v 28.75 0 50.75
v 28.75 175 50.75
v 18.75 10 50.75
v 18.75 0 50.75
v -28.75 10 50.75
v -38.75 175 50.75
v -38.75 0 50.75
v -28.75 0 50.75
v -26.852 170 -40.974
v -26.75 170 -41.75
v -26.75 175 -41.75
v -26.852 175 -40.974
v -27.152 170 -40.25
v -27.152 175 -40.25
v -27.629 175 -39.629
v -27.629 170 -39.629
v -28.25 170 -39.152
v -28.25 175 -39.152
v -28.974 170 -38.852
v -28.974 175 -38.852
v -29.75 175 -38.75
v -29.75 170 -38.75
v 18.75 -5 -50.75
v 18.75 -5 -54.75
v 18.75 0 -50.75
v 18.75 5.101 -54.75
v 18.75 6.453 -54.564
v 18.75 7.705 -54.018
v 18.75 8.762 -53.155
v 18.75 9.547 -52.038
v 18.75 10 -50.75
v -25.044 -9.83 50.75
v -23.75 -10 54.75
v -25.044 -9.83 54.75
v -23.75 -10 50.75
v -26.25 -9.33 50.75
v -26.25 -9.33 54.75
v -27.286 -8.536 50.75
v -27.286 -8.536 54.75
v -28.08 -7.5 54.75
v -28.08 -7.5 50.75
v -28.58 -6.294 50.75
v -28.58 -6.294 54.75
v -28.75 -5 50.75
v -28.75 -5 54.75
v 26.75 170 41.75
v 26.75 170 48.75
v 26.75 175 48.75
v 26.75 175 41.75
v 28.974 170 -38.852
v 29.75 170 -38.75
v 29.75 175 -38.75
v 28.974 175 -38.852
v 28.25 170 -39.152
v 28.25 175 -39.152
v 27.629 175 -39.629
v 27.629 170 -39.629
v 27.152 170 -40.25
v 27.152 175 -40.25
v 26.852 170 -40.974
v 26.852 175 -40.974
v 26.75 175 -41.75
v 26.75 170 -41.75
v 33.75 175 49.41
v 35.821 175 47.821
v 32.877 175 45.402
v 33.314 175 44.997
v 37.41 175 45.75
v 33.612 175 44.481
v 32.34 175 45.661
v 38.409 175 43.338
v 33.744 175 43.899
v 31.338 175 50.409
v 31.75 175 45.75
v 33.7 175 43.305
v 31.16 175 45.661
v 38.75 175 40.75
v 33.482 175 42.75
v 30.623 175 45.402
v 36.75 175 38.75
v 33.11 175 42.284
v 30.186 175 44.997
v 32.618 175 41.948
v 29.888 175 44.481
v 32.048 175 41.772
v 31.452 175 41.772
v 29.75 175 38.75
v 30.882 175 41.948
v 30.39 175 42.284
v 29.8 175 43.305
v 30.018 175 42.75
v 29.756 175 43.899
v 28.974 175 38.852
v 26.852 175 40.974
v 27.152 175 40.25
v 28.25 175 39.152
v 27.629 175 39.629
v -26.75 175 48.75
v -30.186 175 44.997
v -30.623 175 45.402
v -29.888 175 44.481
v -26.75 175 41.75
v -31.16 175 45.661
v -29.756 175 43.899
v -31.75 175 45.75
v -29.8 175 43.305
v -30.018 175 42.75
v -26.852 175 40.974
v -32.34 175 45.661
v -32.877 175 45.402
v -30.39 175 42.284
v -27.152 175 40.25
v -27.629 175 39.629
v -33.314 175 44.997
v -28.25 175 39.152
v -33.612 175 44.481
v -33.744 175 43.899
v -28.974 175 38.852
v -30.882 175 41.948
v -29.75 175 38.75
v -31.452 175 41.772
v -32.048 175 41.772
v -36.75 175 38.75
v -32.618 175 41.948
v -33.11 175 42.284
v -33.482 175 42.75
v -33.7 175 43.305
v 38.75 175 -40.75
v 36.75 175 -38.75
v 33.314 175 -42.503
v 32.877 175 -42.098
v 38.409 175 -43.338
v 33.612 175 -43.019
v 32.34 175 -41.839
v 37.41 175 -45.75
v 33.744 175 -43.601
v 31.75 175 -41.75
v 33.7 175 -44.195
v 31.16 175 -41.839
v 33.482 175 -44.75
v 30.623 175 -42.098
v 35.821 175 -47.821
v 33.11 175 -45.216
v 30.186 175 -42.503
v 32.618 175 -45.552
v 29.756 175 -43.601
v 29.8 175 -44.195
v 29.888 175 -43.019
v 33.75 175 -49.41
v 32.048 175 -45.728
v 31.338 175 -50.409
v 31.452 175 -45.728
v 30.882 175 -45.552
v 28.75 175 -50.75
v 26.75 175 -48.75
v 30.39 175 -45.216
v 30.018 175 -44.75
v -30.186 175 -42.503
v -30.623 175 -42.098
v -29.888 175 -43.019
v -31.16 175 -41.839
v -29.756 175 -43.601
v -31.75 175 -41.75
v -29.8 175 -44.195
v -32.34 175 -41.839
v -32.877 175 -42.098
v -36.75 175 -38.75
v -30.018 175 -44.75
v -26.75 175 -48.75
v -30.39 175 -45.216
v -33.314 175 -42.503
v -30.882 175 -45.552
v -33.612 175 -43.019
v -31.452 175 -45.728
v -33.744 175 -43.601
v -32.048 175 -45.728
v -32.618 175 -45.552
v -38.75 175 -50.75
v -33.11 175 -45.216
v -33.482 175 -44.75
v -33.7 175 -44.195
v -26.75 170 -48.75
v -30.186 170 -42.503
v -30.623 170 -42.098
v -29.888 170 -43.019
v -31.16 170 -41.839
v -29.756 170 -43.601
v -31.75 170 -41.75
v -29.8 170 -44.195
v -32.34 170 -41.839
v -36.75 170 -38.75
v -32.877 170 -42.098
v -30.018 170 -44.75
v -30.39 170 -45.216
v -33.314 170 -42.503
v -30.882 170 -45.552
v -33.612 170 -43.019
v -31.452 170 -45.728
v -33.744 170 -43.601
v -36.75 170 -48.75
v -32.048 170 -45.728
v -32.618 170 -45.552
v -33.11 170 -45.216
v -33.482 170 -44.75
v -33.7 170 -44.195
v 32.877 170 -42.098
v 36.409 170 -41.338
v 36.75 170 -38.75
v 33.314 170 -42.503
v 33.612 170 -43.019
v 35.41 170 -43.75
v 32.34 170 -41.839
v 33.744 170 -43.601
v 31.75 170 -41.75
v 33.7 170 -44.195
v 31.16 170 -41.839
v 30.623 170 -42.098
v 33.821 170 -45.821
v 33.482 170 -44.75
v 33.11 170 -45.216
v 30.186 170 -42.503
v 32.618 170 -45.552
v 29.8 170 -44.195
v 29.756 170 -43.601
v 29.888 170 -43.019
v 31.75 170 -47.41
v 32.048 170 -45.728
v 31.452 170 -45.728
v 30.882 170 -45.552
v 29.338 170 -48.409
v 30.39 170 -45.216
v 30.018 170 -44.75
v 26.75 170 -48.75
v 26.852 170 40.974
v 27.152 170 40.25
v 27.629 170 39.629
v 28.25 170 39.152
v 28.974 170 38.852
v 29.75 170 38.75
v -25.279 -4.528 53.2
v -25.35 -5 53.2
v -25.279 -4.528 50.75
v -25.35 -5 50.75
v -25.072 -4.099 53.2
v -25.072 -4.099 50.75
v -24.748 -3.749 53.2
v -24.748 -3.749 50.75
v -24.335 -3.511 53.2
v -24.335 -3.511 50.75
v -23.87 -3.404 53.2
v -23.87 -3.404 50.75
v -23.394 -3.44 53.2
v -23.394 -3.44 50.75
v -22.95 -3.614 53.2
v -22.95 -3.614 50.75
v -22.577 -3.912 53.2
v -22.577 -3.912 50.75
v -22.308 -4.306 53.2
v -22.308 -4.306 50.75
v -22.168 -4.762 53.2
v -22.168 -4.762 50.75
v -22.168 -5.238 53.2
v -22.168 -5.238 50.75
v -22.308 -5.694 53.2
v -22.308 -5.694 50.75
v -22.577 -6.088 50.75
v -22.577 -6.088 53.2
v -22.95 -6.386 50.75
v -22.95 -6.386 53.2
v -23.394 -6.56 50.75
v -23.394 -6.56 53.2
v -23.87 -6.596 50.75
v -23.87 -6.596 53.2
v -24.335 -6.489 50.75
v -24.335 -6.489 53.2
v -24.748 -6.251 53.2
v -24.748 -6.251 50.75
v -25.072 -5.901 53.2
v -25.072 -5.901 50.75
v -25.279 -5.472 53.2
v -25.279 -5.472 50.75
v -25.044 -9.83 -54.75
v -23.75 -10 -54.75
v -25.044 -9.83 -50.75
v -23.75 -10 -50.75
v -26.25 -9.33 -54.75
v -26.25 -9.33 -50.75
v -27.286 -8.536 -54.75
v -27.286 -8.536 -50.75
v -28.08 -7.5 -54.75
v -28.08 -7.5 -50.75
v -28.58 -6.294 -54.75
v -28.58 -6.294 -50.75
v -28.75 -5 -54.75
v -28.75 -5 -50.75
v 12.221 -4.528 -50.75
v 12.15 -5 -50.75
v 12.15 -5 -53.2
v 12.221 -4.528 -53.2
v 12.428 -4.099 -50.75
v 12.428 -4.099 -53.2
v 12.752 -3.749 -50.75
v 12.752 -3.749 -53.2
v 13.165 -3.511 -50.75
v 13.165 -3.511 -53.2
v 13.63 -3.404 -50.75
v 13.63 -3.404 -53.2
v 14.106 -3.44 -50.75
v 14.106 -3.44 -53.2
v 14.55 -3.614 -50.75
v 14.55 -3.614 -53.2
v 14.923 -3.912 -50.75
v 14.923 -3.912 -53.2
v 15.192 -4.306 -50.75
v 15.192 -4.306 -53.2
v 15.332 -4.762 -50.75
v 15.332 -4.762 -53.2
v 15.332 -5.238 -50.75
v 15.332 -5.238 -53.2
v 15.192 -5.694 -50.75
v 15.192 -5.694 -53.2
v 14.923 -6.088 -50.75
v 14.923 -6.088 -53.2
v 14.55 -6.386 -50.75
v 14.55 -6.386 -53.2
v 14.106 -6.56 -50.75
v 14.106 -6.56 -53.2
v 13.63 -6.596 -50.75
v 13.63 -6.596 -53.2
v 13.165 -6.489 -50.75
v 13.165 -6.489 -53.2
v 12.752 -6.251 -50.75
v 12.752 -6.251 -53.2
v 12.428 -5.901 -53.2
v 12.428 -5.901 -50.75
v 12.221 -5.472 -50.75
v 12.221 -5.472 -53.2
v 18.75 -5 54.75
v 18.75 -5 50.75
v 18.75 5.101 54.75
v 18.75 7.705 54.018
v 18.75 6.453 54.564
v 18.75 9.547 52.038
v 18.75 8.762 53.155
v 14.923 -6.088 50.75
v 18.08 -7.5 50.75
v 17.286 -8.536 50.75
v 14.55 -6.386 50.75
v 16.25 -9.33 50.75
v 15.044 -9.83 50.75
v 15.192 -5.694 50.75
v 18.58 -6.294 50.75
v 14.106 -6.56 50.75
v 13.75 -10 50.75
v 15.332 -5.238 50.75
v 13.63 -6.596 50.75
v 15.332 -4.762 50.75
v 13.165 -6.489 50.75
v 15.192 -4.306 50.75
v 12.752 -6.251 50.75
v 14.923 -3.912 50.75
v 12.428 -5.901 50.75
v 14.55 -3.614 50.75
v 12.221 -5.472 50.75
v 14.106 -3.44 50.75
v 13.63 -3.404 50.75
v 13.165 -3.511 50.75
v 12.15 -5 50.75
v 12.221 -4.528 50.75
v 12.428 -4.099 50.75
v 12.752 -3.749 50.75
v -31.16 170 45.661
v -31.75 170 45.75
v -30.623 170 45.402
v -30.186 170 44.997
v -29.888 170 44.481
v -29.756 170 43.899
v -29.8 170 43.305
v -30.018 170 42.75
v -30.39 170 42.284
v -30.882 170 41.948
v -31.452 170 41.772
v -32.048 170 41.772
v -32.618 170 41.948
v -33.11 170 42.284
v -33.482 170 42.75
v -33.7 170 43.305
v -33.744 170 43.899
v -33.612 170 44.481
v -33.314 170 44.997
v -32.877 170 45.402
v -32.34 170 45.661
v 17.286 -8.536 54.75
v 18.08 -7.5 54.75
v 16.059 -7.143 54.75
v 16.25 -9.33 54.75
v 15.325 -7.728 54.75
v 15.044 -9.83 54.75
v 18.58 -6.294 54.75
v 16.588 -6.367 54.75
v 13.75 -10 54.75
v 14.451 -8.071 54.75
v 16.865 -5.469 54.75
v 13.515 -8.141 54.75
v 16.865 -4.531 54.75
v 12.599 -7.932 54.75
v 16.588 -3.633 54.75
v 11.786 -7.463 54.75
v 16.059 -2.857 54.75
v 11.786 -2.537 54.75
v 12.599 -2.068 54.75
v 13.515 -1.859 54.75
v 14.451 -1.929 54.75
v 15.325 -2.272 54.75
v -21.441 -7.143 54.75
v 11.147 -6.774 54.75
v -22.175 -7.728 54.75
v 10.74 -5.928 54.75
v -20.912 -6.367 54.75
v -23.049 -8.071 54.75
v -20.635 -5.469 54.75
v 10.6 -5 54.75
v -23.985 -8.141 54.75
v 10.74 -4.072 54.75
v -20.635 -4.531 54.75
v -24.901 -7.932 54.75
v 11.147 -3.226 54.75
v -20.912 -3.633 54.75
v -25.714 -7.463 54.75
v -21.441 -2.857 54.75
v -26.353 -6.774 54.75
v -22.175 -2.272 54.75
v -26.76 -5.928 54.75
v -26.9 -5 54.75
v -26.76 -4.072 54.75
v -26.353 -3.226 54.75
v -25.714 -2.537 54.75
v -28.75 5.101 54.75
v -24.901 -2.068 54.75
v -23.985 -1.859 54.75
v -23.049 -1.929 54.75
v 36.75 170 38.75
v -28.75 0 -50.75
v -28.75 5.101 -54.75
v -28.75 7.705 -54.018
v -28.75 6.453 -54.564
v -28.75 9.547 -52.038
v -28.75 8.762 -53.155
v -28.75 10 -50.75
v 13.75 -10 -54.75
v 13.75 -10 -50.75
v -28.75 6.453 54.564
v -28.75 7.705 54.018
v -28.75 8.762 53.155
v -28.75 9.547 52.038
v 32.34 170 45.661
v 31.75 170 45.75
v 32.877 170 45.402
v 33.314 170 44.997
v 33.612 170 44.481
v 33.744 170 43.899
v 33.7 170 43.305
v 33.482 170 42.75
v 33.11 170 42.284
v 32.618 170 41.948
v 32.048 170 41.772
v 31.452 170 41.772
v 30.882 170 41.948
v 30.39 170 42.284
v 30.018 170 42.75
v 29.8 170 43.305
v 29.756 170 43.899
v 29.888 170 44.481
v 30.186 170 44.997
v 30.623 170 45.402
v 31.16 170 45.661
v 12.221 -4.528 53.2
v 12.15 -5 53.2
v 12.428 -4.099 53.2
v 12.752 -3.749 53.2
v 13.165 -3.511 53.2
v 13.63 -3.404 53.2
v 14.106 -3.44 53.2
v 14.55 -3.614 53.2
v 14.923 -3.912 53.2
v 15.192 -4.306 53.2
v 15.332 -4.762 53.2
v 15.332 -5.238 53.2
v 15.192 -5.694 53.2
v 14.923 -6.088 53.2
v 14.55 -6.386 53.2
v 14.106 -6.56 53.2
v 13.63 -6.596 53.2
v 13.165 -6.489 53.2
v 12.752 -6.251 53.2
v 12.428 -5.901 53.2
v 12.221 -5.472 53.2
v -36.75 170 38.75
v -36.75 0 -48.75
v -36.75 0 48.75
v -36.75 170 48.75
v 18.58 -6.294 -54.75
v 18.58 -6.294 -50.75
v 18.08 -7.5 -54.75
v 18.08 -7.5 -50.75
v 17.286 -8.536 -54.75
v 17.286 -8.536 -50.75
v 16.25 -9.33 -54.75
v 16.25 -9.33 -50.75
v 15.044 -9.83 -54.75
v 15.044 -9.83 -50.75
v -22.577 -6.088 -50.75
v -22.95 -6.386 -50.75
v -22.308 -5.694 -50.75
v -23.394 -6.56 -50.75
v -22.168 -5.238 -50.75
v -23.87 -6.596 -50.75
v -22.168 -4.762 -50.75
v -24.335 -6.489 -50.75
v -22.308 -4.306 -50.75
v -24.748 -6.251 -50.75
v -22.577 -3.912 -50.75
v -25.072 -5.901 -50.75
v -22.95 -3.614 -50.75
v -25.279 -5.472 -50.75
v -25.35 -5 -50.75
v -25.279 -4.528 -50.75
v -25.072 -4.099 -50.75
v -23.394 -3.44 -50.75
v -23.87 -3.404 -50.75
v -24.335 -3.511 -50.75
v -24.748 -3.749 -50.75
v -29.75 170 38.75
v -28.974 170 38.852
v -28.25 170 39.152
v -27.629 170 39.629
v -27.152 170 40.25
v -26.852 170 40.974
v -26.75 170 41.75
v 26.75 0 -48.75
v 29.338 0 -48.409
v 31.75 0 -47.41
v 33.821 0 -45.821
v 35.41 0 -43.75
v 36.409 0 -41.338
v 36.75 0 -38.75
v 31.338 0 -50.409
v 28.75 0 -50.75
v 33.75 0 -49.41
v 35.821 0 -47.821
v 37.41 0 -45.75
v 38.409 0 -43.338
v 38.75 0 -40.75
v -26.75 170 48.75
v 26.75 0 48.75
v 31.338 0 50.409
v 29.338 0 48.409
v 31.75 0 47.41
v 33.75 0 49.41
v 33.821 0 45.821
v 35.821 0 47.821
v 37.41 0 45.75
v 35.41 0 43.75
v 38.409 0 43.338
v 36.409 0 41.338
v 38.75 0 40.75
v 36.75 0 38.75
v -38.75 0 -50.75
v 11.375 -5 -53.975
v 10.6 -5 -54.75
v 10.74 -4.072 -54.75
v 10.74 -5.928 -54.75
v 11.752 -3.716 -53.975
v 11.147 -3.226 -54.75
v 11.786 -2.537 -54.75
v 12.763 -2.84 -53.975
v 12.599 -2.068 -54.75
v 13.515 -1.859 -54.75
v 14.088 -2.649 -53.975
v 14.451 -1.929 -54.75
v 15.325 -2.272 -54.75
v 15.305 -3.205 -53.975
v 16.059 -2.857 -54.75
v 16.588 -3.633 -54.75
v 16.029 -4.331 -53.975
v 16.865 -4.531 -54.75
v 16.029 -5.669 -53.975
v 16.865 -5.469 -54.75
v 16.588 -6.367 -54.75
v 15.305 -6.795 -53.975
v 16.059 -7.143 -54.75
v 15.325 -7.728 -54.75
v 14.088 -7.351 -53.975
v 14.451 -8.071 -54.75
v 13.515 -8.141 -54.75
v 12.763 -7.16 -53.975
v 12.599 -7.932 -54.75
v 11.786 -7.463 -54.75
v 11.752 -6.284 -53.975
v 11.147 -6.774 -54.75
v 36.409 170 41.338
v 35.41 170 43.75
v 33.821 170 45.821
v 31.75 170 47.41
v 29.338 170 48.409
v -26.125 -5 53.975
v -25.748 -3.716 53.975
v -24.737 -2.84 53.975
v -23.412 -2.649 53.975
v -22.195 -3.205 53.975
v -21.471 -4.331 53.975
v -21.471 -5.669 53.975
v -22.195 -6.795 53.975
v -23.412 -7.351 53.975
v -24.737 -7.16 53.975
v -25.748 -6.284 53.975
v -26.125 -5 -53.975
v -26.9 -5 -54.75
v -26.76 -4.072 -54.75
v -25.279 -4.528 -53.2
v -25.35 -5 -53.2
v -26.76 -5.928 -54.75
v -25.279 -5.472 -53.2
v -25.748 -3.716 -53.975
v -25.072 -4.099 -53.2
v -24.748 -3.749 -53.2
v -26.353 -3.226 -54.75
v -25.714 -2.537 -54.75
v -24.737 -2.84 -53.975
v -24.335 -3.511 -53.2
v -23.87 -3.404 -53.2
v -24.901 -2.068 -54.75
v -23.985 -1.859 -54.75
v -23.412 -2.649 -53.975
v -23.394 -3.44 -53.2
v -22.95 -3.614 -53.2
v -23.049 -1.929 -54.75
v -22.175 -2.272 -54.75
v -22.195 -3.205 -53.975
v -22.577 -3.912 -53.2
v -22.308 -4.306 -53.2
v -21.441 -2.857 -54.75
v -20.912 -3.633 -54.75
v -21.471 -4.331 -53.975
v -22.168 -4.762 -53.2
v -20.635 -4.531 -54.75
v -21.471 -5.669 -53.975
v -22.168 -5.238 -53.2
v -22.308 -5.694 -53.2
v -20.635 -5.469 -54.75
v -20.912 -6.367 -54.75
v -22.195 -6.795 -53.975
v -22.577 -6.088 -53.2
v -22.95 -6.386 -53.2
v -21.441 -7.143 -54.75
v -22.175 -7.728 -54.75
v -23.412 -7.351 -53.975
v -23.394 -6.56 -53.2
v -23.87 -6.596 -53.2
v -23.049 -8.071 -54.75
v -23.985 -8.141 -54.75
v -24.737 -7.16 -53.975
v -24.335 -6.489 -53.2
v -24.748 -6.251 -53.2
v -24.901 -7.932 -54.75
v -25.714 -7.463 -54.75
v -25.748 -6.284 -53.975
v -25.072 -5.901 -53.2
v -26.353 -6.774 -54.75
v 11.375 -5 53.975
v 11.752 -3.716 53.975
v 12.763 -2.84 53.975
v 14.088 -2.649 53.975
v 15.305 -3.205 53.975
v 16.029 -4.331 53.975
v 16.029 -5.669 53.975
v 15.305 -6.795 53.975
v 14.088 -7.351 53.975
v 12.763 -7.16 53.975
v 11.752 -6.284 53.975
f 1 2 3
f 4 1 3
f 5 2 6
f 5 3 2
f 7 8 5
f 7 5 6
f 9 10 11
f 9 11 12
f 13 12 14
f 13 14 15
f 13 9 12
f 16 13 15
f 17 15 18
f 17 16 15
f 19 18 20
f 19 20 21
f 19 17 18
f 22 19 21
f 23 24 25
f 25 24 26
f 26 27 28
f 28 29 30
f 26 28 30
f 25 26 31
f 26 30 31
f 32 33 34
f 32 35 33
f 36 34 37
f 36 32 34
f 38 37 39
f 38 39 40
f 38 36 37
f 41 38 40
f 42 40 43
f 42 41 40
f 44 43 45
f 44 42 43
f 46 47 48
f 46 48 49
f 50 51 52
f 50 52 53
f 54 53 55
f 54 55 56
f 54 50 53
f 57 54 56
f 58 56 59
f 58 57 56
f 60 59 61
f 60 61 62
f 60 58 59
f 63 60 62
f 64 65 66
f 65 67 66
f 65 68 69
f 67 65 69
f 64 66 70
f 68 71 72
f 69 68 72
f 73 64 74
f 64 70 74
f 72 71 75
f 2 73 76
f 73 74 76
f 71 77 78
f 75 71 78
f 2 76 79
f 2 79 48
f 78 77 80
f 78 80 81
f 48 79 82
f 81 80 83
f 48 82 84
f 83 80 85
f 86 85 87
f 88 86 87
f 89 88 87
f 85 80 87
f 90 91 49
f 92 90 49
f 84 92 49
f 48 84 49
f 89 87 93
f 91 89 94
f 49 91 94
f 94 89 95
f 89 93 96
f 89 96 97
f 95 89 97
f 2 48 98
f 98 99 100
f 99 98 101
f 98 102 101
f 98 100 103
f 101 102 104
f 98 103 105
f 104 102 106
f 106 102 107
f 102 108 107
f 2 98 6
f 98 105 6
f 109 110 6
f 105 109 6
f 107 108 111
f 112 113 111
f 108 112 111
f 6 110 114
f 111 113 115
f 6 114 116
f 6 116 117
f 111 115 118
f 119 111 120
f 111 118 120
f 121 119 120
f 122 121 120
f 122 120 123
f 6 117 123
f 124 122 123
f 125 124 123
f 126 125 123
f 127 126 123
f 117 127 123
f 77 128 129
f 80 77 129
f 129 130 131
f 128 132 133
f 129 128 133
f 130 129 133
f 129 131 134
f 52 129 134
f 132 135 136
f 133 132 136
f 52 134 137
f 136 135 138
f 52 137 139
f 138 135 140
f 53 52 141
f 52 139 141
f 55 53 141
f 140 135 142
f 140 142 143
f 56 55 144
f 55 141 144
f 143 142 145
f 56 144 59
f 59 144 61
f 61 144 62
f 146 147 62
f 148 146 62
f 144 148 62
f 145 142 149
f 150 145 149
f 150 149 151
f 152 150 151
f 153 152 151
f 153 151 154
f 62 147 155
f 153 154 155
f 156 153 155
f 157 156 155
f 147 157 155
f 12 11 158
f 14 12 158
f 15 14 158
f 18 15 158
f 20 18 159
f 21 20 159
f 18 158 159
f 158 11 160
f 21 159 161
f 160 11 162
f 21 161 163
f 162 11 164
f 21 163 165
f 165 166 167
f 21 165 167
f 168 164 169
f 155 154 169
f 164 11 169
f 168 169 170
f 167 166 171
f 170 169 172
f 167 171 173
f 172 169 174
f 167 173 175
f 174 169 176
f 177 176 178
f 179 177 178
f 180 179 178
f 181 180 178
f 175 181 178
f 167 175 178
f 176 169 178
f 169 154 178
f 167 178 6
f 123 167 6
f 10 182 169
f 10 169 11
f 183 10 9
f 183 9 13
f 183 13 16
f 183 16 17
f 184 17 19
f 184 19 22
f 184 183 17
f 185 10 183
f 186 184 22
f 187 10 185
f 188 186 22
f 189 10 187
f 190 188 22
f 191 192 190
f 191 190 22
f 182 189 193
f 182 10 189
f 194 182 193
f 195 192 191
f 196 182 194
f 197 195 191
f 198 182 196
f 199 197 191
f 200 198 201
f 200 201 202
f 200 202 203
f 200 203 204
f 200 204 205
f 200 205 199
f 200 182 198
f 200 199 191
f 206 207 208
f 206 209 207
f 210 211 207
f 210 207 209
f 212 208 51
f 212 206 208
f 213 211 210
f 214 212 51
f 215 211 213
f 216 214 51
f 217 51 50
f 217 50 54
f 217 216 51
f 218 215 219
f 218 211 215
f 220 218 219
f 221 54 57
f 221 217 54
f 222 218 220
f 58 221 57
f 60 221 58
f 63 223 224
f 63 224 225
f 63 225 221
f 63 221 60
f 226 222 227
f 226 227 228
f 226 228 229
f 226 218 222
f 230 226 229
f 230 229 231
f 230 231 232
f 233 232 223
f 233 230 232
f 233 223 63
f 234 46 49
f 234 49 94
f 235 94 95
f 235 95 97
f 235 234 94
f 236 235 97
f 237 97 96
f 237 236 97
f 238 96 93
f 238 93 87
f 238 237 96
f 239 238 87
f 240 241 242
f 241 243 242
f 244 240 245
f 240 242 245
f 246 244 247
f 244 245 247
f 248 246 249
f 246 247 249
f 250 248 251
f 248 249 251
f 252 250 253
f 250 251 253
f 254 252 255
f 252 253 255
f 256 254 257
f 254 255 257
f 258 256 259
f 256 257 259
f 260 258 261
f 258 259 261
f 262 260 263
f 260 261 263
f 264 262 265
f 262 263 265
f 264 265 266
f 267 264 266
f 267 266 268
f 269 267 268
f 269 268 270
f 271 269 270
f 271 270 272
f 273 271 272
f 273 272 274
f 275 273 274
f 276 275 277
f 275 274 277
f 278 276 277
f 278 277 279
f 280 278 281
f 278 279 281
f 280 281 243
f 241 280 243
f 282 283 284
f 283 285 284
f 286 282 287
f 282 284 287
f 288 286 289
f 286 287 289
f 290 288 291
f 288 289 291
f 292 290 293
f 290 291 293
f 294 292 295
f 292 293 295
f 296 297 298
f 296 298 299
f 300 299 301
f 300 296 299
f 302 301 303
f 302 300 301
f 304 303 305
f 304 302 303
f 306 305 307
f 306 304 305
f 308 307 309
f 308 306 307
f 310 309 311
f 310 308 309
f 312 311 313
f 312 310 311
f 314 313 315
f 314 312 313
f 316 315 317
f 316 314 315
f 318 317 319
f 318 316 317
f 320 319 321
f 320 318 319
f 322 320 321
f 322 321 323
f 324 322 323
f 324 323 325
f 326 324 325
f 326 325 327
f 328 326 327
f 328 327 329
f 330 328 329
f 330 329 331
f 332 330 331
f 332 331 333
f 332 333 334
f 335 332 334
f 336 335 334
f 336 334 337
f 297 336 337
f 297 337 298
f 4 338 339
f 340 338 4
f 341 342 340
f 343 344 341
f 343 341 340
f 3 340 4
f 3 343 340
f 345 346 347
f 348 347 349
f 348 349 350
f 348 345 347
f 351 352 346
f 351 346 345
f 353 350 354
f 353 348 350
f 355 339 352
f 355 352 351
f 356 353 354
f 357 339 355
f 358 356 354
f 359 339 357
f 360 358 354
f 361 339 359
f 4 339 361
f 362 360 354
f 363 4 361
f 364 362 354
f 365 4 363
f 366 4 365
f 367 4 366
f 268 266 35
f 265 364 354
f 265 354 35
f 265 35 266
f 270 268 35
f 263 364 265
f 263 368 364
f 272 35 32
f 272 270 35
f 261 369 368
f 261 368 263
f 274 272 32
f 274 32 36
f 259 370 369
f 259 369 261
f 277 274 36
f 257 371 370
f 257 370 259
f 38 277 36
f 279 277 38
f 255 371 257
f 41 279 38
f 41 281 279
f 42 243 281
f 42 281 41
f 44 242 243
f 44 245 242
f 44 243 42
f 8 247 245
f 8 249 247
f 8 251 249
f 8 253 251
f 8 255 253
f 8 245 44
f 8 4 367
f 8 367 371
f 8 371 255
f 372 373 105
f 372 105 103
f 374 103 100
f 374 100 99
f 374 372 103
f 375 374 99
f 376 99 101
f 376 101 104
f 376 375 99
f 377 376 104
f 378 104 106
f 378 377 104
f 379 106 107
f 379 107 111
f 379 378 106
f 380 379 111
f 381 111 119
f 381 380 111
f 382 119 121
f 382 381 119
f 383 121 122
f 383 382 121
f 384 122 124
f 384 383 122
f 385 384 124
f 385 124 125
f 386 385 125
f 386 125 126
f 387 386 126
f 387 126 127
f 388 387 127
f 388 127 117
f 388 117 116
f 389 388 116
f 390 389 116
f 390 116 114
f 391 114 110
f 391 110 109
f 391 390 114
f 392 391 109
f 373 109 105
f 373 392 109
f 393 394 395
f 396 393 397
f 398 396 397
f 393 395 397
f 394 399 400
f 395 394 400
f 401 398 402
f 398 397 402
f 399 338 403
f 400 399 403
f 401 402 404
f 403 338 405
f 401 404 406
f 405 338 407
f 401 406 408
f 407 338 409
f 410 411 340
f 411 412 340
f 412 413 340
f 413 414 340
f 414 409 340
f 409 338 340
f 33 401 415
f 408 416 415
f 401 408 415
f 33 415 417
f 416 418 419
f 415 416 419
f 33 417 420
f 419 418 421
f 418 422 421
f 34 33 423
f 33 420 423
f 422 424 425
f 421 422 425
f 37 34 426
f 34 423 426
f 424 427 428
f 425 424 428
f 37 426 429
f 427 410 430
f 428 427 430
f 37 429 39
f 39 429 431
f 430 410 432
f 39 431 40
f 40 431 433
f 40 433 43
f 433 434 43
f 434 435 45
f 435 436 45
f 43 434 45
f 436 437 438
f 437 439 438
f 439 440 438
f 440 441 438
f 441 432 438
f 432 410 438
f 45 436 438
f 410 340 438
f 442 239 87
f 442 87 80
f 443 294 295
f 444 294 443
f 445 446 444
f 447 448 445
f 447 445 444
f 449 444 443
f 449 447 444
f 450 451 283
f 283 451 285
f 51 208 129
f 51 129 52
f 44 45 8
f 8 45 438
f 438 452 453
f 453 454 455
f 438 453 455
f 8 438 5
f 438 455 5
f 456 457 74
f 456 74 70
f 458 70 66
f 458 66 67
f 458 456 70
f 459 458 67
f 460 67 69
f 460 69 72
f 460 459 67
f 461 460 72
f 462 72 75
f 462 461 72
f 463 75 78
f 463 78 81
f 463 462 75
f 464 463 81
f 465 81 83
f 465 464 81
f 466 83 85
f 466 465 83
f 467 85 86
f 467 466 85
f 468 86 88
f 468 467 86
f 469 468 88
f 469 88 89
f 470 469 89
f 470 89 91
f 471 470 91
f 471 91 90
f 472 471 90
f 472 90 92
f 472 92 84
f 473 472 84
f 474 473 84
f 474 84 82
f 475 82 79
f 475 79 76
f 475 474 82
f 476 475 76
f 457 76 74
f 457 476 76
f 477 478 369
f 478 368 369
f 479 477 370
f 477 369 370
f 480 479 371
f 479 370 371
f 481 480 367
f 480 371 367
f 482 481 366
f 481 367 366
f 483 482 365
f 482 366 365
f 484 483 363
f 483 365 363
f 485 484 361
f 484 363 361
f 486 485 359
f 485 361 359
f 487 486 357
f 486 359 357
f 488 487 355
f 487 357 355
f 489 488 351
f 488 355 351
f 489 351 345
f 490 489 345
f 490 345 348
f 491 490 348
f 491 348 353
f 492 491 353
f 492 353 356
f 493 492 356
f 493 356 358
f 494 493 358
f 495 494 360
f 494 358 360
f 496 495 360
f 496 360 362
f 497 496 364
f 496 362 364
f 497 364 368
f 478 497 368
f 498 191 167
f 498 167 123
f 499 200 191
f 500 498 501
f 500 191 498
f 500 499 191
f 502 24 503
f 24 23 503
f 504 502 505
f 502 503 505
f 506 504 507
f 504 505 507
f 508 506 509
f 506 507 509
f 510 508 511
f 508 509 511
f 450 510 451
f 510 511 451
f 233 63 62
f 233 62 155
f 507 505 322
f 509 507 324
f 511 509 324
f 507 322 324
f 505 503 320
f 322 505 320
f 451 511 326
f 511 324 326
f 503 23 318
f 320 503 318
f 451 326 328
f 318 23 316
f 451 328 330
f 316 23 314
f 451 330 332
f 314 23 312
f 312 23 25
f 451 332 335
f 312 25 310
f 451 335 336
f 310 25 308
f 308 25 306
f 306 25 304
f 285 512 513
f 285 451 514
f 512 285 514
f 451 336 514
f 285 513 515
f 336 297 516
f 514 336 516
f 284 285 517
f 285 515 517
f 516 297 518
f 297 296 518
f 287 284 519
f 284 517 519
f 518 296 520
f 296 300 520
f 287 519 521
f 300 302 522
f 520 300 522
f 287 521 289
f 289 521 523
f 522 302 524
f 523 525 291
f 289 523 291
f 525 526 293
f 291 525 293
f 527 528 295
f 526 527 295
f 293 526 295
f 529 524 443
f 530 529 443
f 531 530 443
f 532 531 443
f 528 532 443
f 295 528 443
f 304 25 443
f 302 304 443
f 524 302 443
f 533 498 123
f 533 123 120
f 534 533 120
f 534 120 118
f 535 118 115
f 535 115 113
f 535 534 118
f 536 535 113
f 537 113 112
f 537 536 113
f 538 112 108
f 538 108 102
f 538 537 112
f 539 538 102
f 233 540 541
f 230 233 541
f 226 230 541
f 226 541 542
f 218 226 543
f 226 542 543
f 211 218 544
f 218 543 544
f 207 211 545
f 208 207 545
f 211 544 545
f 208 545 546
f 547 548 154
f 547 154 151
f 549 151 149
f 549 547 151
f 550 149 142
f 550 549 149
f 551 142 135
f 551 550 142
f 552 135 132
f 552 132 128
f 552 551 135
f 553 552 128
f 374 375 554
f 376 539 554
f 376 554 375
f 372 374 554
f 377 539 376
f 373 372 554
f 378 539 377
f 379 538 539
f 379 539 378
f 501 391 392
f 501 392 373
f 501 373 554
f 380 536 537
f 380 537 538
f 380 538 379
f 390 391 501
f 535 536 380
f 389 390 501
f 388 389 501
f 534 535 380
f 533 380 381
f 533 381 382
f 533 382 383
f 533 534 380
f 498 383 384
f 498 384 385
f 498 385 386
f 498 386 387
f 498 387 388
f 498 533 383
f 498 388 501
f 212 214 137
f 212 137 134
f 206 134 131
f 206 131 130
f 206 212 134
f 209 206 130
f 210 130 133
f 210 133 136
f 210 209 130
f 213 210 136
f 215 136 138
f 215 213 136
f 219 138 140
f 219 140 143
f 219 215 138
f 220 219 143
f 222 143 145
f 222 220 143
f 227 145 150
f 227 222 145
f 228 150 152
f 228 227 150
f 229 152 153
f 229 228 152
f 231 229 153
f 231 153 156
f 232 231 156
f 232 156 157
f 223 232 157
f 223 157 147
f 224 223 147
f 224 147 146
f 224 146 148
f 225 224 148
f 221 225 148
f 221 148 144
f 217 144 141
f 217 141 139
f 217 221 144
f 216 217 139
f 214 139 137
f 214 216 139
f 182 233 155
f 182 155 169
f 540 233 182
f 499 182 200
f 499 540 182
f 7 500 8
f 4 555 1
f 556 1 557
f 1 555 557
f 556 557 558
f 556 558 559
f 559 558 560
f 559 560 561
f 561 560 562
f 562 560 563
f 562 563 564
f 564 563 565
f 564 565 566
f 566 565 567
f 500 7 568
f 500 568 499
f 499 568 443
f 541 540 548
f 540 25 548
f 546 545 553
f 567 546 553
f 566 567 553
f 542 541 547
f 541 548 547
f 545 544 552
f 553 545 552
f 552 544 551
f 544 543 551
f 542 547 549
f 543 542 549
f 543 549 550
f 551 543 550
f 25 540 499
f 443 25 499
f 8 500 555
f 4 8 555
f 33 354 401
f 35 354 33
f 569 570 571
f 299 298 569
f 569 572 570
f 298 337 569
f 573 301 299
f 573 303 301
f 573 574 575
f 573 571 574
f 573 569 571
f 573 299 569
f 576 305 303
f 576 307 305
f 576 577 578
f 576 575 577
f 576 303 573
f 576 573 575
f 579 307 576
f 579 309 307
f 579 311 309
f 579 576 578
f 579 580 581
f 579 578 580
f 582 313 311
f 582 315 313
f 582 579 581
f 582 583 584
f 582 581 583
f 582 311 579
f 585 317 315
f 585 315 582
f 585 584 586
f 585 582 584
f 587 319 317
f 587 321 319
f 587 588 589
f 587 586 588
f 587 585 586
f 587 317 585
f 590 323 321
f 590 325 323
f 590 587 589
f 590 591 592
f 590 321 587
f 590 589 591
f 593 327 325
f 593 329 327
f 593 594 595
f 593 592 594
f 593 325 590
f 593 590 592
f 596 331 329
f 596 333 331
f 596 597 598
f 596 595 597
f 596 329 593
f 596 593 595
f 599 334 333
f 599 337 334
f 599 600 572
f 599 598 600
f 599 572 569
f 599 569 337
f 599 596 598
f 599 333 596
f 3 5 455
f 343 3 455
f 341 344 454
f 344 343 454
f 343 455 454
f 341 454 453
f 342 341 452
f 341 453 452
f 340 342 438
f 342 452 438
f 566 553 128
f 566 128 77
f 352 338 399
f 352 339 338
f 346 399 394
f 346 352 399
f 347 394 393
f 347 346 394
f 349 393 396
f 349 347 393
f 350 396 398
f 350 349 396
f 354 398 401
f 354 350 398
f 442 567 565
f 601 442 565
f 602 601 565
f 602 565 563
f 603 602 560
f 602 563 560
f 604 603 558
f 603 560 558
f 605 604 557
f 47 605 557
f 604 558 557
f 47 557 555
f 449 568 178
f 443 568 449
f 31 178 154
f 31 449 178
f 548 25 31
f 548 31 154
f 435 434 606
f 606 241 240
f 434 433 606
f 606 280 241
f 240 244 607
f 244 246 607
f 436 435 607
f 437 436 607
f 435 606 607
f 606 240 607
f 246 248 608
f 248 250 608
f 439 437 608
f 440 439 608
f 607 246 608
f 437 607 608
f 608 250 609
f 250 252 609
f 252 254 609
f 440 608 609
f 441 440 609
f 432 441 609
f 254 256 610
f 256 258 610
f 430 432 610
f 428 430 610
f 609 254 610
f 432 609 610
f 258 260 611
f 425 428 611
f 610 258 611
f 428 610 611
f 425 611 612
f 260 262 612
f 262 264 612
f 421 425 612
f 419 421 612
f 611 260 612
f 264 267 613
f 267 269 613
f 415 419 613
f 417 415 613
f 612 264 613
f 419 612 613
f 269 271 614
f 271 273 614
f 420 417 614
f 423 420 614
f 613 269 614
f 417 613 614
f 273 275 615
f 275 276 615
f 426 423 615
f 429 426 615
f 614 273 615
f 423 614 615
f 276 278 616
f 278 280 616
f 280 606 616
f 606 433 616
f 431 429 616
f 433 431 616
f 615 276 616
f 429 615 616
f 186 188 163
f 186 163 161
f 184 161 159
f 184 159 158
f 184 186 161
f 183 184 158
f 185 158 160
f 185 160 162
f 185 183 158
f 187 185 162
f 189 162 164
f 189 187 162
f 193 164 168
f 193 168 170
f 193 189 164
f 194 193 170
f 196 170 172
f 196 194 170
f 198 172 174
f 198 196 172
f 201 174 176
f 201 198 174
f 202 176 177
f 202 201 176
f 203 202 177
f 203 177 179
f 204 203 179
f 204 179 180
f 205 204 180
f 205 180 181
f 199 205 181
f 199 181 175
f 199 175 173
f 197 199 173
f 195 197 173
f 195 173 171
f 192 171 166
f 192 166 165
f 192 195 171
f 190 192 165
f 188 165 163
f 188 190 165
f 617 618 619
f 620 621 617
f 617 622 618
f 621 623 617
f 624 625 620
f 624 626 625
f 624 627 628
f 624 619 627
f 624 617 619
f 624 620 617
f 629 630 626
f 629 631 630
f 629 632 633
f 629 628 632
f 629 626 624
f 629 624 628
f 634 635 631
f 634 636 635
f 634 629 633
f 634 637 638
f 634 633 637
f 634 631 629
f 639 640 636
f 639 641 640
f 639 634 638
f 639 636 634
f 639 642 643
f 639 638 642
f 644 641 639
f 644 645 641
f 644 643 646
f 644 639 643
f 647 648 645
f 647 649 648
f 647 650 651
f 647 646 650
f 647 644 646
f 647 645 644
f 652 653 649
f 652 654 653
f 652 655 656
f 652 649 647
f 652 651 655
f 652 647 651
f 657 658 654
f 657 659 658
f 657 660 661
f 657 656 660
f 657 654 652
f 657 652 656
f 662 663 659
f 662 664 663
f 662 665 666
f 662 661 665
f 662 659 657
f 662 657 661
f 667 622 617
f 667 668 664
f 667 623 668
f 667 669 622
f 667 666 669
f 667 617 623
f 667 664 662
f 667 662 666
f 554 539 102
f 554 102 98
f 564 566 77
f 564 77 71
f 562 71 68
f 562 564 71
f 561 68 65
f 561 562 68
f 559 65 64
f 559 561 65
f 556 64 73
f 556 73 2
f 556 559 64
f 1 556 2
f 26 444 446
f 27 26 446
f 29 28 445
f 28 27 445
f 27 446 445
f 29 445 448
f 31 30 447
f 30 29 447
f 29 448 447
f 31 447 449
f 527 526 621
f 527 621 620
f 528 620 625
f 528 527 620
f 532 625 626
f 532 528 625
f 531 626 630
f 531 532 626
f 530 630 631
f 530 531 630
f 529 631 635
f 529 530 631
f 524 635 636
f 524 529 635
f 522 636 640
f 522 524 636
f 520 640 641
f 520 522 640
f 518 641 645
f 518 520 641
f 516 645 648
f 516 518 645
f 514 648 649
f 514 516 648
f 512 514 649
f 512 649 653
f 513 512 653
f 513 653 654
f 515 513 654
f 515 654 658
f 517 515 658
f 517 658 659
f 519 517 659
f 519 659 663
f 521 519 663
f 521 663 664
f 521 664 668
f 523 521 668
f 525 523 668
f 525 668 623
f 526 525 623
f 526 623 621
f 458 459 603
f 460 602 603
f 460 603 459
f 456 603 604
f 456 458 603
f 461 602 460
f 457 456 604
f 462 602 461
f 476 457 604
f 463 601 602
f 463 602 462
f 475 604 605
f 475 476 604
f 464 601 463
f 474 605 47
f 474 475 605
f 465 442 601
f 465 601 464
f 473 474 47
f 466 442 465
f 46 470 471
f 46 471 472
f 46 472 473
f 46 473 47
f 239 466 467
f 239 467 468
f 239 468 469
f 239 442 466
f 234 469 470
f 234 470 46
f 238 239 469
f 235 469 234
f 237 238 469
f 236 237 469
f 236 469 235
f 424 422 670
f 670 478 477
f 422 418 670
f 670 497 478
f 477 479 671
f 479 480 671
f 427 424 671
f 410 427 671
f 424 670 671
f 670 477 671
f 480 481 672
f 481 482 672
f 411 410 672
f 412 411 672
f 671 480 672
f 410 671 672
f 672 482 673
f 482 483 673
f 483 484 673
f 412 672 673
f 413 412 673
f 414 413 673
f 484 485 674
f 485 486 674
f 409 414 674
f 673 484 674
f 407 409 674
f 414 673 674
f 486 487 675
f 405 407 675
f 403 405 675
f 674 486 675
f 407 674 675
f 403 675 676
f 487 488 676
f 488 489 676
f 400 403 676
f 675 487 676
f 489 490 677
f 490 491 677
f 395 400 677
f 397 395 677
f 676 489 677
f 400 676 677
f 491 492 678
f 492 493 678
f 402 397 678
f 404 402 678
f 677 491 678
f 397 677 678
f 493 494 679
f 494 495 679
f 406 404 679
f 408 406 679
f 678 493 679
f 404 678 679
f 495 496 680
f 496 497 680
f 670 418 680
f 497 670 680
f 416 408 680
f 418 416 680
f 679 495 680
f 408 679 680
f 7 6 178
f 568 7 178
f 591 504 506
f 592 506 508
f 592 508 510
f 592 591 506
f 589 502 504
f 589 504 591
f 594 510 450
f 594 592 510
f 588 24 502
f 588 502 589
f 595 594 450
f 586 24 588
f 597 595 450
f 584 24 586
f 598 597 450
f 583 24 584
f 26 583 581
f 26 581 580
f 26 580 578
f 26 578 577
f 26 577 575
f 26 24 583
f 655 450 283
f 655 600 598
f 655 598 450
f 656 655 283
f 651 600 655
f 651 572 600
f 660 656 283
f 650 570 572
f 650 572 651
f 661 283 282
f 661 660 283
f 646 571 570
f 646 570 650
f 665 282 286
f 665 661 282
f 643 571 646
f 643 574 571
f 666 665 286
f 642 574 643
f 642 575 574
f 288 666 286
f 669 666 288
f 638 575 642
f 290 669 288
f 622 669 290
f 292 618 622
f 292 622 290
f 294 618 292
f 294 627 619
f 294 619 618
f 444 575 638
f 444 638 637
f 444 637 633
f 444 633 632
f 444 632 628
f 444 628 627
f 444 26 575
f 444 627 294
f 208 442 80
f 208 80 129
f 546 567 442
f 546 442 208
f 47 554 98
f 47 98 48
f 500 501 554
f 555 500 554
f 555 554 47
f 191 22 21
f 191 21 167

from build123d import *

# Parameters (mm, degrees)
BOSS_EXTRUDE1_DEPTH                             = 170
SKETCH3_R                                       = 2
BOSS_EXTRUDE2_DEPTH                             = 5
SKETCH4_W                                       = 47.5
SKETCH4_H                                       = 4
BOSS_EXTRUDE3_DEPTH                             = 20
FILLET1_R                                       = 5
FILLET2_R                                       = 5
CSK_FOR_M3_FLAT_HEAD_MACHINE_SCREW1_D           = 3.2
CSK_FOR_M3_FLAT_HEAD_MACHINE_SCREW1_CSINK_D     = 6.3
CSK_FOR_M3_FLAT_HEAD_MACHINE_SCREW1_CSINK_ANGLE = 90
FILLET1_OF_MIRROR1_R                            = 5
FILLET2_OF_MIRROR1_R                            = 5


with BuildPart() as part:
    # Sketch1 → Boss-Extrude1 (new body)
    with BuildSketch(Plane(origin=(0, 0, 0), x_dir=(1, 0, 0), z_dir=(0, 1, 0))):
        with BuildLine():
            Line((-38.75, -50.75), (28.75, -50.75))
            ThreePointArc((28.75, -50.75), (35.821067812, -47.821067812), (38.75, -40.75))
            Line((38.75, -40.75), (38.75, 40.75))
            ThreePointArc((38.75, 40.75), (35.821067812, 47.821067812), (28.75, 50.75))
            Line((28.75, 50.75), (-38.75, 50.75))
            Line((-38.75, 50.75), (-38.75, -50.75))
        make_face()
        with BuildLine():
            Line((-36.75, 48.75), (26.75, 48.75))
            ThreePointArc((26.75, 48.75), (33.821067812, 45.821067812), (36.75, 38.75))
            Line((36.75, 38.75), (36.75, -38.75))
            ThreePointArc((36.75, -38.75), (33.821067812, -45.821067812), (26.75, -48.75))
            Line((26.75, -48.75), (-36.75, -48.75))
            Line((-36.75, -48.75), (-36.75, 48.75))
        make_face(mode=Mode.SUBTRACT)
    extrude(amount=BOSS_EXTRUDE1_DEPTH)

    # Sketch3 → Boss-Extrude2 (add)
    with BuildSketch(Plane(origin=(0, 170, 0), x_dir=(1, 0, 0), z_dir=(0, 1, 0))):
        with BuildLine():
            Line((-38.75, 50.75), (28.75, 50.75))
            ThreePointArc((28.75, 50.75), (35.821067812, 47.821067812), (38.75, 40.75))
            Line((38.75, 40.75), (38.75, -40.75))
            ThreePointArc((38.75, -40.75), (35.821067812, -47.821067812), (28.75, -50.75))
            Line((28.75, -50.75), (-38.75, -50.75))
            Line((-38.75, -50.75), (-38.75, 50.75))
        make_face()
        with Locations(Location((-31.75, -43.75, 0), (0, 0, 270))):
            Circle(SKETCH3_R, mode=Mode.SUBTRACT)
        with Locations(Location((-31.75, 43.75, 0), (0, 0, 270))):
            Circle(SKETCH3_R, mode=Mode.SUBTRACT)
        with Locations(Location((31.75, 43.75, 0), (0, 0, 270))):
            Circle(SKETCH3_R, mode=Mode.SUBTRACT)
        with Locations(Location((31.75, -43.75, 0), (0, 0, 270))):
            Circle(SKETCH3_R, mode=Mode.SUBTRACT)
        with BuildLine():
            Line((-36.75, 38.75), (-36.75, -38.75))
            Line((-36.75, -38.75), (-29.75, -38.75))
            ThreePointArc((-29.75, -38.75), (-27.628679656, -39.628679656), (-26.75, -41.75))
            Line((-26.75, -41.75), (-26.75, -48.75))
            Line((-26.75, -48.75), (26.75, -48.75))
            Line((26.75, -48.75), (26.75, -41.75))
            ThreePointArc((26.75, -41.75), (27.628679656, -39.628679656), (29.75, -38.75))
            Line((29.75, -38.75), (36.75, -38.75))
            Line((36.75, -38.75), (36.75, 38.75))
            Line((36.75, 38.75), (29.75, 38.75))
            ThreePointArc((29.75, 38.75), (27.628679656, 39.628679656), (26.75, 41.75))
            Line((26.75, 41.75), (26.75, 48.75))
            Line((26.75, 48.75), (-26.75, 48.75))
            Line((-26.75, 48.75), (-26.75, 41.75))
            ThreePointArc((-26.75, 41.75), (-27.628679656, 39.628679656), (-29.75, 38.75))
            Line((-29.75, 38.75), (-36.75, 38.75))
        make_face(mode=Mode.SUBTRACT)
    extrude(amount=BOSS_EXTRUDE2_DEPTH)

    # Sketch4 → Boss-Extrude3 (add)
    with BuildSketch(Plane(origin=(0, 10, 0), x_dir=(-1, 0, 0), z_dir=(0, -1, 0))):
        with Locations((5, -52.75)):
            Rectangle(SKETCH4_W, SKETCH4_H)
    boss_extrude3 = extrude(amount=BOSS_EXTRUDE3_DEPTH)

    # Fillet1
    fillet1_edges = [part.edges().sort_by_distance(p)[0] for p in [
        (18.75, -10, 52.75),
        (-28.75, -10, 52.75),
    ]]
    fillet(fillet1_edges, radius=FILLET1_R)

    # Fillet2
    # the kernel refuses this fillet: 5 mm, written as the material it takes off along each edge
    with BuildSketch(Plane(origin=(-40.997448714, 10, 54.75), x_dir=(0, -1, 0), z_dir=(1, 0, 0))) as fillet2_piece_1:
        with BuildLine():
            CenterArc((4.898979486, 5), FILLET2_R, 191.536959033, 78.463040967)
            Line((0, 4), (-0.09797959, 3.98))
            ThreePointArc((-0.09797959, 3.98), (-0.1, 2), (-0.1, 0))
            Line((-0.1, 0), (0, -0.1))
            Line((0, -0.1), (4.898979486, -0.1))
            Line((4.898979486, -0.1), (4.898979486, 0))
        make_face()
    extrude(amount=71.994897428, mode=Mode.SUBTRACT)

    # CSK for M3 Flat Head Machine Screw1 (through all)
    with Locations(Plane.XY.offset(54.75)):
        with Locations((13.75, -5), (-23.75, -5)):
            csk_for_m3_flat_head_machine_screw1 = CounterSinkHole(CSK_FOR_M3_FLAT_HEAD_MACHINE_SCREW1_D / 2, CSK_FOR_M3_FLAT_HEAD_MACHINE_SCREW1_CSINK_D / 2, counter_sink_angle=CSK_FOR_M3_FLAT_HEAD_MACHINE_SCREW1_CSINK_ANGLE)

    # Mirror1: Boss-Extrude3, CSK for M3 Flat Head Machine Screw1 across plane
    add(boss_extrude3.mirror(Plane.XY))
    add(csk_for_m3_flat_head_machine_screw1.mirror(Plane.XY), mode=Mode.SUBTRACT)

    # Fillet1 of Mirror1
    fillet1_of_mirror1_edges = [part.edges().sort_by_distance(p)[0] for p in [
        (18.75, -10, -52.75),
        (-28.75, -10, -52.75),
    ]]
    fillet(fillet1_of_mirror1_edges, radius=FILLET1_OF_MIRROR1_R)

    # Fillet2 of Mirror1
    # the kernel refuses this fillet: 5 mm, written as the material it takes off along each edge
    with BuildSketch(Plane(origin=(-40.997448714, 10, -54.75), x_dir=(0, -1, 0), z_dir=(1, 0, 0))) as fillet2_of_mirror1_piece_1:
        with BuildLine():
            CenterArc((4.898979486, -5), FILLET2_OF_MIRROR1_R, 90, 78.463040967)
            Line((0, -4), (-0.09797959, -3.98))
            ThreePointArc((-0.09797959, -3.98), (-0.1, -2), (-0.1, 0))
            Line((-0.1, 0), (0, 0.1))
            Line((0, 0.1), (4.898979486, 0.1))
            Line((4.898979486, 0.1), (4.898979486, 0))
        make_face()
    extrude(amount=71.994897428, mode=Mode.SUBTRACT)


solid = part.part
